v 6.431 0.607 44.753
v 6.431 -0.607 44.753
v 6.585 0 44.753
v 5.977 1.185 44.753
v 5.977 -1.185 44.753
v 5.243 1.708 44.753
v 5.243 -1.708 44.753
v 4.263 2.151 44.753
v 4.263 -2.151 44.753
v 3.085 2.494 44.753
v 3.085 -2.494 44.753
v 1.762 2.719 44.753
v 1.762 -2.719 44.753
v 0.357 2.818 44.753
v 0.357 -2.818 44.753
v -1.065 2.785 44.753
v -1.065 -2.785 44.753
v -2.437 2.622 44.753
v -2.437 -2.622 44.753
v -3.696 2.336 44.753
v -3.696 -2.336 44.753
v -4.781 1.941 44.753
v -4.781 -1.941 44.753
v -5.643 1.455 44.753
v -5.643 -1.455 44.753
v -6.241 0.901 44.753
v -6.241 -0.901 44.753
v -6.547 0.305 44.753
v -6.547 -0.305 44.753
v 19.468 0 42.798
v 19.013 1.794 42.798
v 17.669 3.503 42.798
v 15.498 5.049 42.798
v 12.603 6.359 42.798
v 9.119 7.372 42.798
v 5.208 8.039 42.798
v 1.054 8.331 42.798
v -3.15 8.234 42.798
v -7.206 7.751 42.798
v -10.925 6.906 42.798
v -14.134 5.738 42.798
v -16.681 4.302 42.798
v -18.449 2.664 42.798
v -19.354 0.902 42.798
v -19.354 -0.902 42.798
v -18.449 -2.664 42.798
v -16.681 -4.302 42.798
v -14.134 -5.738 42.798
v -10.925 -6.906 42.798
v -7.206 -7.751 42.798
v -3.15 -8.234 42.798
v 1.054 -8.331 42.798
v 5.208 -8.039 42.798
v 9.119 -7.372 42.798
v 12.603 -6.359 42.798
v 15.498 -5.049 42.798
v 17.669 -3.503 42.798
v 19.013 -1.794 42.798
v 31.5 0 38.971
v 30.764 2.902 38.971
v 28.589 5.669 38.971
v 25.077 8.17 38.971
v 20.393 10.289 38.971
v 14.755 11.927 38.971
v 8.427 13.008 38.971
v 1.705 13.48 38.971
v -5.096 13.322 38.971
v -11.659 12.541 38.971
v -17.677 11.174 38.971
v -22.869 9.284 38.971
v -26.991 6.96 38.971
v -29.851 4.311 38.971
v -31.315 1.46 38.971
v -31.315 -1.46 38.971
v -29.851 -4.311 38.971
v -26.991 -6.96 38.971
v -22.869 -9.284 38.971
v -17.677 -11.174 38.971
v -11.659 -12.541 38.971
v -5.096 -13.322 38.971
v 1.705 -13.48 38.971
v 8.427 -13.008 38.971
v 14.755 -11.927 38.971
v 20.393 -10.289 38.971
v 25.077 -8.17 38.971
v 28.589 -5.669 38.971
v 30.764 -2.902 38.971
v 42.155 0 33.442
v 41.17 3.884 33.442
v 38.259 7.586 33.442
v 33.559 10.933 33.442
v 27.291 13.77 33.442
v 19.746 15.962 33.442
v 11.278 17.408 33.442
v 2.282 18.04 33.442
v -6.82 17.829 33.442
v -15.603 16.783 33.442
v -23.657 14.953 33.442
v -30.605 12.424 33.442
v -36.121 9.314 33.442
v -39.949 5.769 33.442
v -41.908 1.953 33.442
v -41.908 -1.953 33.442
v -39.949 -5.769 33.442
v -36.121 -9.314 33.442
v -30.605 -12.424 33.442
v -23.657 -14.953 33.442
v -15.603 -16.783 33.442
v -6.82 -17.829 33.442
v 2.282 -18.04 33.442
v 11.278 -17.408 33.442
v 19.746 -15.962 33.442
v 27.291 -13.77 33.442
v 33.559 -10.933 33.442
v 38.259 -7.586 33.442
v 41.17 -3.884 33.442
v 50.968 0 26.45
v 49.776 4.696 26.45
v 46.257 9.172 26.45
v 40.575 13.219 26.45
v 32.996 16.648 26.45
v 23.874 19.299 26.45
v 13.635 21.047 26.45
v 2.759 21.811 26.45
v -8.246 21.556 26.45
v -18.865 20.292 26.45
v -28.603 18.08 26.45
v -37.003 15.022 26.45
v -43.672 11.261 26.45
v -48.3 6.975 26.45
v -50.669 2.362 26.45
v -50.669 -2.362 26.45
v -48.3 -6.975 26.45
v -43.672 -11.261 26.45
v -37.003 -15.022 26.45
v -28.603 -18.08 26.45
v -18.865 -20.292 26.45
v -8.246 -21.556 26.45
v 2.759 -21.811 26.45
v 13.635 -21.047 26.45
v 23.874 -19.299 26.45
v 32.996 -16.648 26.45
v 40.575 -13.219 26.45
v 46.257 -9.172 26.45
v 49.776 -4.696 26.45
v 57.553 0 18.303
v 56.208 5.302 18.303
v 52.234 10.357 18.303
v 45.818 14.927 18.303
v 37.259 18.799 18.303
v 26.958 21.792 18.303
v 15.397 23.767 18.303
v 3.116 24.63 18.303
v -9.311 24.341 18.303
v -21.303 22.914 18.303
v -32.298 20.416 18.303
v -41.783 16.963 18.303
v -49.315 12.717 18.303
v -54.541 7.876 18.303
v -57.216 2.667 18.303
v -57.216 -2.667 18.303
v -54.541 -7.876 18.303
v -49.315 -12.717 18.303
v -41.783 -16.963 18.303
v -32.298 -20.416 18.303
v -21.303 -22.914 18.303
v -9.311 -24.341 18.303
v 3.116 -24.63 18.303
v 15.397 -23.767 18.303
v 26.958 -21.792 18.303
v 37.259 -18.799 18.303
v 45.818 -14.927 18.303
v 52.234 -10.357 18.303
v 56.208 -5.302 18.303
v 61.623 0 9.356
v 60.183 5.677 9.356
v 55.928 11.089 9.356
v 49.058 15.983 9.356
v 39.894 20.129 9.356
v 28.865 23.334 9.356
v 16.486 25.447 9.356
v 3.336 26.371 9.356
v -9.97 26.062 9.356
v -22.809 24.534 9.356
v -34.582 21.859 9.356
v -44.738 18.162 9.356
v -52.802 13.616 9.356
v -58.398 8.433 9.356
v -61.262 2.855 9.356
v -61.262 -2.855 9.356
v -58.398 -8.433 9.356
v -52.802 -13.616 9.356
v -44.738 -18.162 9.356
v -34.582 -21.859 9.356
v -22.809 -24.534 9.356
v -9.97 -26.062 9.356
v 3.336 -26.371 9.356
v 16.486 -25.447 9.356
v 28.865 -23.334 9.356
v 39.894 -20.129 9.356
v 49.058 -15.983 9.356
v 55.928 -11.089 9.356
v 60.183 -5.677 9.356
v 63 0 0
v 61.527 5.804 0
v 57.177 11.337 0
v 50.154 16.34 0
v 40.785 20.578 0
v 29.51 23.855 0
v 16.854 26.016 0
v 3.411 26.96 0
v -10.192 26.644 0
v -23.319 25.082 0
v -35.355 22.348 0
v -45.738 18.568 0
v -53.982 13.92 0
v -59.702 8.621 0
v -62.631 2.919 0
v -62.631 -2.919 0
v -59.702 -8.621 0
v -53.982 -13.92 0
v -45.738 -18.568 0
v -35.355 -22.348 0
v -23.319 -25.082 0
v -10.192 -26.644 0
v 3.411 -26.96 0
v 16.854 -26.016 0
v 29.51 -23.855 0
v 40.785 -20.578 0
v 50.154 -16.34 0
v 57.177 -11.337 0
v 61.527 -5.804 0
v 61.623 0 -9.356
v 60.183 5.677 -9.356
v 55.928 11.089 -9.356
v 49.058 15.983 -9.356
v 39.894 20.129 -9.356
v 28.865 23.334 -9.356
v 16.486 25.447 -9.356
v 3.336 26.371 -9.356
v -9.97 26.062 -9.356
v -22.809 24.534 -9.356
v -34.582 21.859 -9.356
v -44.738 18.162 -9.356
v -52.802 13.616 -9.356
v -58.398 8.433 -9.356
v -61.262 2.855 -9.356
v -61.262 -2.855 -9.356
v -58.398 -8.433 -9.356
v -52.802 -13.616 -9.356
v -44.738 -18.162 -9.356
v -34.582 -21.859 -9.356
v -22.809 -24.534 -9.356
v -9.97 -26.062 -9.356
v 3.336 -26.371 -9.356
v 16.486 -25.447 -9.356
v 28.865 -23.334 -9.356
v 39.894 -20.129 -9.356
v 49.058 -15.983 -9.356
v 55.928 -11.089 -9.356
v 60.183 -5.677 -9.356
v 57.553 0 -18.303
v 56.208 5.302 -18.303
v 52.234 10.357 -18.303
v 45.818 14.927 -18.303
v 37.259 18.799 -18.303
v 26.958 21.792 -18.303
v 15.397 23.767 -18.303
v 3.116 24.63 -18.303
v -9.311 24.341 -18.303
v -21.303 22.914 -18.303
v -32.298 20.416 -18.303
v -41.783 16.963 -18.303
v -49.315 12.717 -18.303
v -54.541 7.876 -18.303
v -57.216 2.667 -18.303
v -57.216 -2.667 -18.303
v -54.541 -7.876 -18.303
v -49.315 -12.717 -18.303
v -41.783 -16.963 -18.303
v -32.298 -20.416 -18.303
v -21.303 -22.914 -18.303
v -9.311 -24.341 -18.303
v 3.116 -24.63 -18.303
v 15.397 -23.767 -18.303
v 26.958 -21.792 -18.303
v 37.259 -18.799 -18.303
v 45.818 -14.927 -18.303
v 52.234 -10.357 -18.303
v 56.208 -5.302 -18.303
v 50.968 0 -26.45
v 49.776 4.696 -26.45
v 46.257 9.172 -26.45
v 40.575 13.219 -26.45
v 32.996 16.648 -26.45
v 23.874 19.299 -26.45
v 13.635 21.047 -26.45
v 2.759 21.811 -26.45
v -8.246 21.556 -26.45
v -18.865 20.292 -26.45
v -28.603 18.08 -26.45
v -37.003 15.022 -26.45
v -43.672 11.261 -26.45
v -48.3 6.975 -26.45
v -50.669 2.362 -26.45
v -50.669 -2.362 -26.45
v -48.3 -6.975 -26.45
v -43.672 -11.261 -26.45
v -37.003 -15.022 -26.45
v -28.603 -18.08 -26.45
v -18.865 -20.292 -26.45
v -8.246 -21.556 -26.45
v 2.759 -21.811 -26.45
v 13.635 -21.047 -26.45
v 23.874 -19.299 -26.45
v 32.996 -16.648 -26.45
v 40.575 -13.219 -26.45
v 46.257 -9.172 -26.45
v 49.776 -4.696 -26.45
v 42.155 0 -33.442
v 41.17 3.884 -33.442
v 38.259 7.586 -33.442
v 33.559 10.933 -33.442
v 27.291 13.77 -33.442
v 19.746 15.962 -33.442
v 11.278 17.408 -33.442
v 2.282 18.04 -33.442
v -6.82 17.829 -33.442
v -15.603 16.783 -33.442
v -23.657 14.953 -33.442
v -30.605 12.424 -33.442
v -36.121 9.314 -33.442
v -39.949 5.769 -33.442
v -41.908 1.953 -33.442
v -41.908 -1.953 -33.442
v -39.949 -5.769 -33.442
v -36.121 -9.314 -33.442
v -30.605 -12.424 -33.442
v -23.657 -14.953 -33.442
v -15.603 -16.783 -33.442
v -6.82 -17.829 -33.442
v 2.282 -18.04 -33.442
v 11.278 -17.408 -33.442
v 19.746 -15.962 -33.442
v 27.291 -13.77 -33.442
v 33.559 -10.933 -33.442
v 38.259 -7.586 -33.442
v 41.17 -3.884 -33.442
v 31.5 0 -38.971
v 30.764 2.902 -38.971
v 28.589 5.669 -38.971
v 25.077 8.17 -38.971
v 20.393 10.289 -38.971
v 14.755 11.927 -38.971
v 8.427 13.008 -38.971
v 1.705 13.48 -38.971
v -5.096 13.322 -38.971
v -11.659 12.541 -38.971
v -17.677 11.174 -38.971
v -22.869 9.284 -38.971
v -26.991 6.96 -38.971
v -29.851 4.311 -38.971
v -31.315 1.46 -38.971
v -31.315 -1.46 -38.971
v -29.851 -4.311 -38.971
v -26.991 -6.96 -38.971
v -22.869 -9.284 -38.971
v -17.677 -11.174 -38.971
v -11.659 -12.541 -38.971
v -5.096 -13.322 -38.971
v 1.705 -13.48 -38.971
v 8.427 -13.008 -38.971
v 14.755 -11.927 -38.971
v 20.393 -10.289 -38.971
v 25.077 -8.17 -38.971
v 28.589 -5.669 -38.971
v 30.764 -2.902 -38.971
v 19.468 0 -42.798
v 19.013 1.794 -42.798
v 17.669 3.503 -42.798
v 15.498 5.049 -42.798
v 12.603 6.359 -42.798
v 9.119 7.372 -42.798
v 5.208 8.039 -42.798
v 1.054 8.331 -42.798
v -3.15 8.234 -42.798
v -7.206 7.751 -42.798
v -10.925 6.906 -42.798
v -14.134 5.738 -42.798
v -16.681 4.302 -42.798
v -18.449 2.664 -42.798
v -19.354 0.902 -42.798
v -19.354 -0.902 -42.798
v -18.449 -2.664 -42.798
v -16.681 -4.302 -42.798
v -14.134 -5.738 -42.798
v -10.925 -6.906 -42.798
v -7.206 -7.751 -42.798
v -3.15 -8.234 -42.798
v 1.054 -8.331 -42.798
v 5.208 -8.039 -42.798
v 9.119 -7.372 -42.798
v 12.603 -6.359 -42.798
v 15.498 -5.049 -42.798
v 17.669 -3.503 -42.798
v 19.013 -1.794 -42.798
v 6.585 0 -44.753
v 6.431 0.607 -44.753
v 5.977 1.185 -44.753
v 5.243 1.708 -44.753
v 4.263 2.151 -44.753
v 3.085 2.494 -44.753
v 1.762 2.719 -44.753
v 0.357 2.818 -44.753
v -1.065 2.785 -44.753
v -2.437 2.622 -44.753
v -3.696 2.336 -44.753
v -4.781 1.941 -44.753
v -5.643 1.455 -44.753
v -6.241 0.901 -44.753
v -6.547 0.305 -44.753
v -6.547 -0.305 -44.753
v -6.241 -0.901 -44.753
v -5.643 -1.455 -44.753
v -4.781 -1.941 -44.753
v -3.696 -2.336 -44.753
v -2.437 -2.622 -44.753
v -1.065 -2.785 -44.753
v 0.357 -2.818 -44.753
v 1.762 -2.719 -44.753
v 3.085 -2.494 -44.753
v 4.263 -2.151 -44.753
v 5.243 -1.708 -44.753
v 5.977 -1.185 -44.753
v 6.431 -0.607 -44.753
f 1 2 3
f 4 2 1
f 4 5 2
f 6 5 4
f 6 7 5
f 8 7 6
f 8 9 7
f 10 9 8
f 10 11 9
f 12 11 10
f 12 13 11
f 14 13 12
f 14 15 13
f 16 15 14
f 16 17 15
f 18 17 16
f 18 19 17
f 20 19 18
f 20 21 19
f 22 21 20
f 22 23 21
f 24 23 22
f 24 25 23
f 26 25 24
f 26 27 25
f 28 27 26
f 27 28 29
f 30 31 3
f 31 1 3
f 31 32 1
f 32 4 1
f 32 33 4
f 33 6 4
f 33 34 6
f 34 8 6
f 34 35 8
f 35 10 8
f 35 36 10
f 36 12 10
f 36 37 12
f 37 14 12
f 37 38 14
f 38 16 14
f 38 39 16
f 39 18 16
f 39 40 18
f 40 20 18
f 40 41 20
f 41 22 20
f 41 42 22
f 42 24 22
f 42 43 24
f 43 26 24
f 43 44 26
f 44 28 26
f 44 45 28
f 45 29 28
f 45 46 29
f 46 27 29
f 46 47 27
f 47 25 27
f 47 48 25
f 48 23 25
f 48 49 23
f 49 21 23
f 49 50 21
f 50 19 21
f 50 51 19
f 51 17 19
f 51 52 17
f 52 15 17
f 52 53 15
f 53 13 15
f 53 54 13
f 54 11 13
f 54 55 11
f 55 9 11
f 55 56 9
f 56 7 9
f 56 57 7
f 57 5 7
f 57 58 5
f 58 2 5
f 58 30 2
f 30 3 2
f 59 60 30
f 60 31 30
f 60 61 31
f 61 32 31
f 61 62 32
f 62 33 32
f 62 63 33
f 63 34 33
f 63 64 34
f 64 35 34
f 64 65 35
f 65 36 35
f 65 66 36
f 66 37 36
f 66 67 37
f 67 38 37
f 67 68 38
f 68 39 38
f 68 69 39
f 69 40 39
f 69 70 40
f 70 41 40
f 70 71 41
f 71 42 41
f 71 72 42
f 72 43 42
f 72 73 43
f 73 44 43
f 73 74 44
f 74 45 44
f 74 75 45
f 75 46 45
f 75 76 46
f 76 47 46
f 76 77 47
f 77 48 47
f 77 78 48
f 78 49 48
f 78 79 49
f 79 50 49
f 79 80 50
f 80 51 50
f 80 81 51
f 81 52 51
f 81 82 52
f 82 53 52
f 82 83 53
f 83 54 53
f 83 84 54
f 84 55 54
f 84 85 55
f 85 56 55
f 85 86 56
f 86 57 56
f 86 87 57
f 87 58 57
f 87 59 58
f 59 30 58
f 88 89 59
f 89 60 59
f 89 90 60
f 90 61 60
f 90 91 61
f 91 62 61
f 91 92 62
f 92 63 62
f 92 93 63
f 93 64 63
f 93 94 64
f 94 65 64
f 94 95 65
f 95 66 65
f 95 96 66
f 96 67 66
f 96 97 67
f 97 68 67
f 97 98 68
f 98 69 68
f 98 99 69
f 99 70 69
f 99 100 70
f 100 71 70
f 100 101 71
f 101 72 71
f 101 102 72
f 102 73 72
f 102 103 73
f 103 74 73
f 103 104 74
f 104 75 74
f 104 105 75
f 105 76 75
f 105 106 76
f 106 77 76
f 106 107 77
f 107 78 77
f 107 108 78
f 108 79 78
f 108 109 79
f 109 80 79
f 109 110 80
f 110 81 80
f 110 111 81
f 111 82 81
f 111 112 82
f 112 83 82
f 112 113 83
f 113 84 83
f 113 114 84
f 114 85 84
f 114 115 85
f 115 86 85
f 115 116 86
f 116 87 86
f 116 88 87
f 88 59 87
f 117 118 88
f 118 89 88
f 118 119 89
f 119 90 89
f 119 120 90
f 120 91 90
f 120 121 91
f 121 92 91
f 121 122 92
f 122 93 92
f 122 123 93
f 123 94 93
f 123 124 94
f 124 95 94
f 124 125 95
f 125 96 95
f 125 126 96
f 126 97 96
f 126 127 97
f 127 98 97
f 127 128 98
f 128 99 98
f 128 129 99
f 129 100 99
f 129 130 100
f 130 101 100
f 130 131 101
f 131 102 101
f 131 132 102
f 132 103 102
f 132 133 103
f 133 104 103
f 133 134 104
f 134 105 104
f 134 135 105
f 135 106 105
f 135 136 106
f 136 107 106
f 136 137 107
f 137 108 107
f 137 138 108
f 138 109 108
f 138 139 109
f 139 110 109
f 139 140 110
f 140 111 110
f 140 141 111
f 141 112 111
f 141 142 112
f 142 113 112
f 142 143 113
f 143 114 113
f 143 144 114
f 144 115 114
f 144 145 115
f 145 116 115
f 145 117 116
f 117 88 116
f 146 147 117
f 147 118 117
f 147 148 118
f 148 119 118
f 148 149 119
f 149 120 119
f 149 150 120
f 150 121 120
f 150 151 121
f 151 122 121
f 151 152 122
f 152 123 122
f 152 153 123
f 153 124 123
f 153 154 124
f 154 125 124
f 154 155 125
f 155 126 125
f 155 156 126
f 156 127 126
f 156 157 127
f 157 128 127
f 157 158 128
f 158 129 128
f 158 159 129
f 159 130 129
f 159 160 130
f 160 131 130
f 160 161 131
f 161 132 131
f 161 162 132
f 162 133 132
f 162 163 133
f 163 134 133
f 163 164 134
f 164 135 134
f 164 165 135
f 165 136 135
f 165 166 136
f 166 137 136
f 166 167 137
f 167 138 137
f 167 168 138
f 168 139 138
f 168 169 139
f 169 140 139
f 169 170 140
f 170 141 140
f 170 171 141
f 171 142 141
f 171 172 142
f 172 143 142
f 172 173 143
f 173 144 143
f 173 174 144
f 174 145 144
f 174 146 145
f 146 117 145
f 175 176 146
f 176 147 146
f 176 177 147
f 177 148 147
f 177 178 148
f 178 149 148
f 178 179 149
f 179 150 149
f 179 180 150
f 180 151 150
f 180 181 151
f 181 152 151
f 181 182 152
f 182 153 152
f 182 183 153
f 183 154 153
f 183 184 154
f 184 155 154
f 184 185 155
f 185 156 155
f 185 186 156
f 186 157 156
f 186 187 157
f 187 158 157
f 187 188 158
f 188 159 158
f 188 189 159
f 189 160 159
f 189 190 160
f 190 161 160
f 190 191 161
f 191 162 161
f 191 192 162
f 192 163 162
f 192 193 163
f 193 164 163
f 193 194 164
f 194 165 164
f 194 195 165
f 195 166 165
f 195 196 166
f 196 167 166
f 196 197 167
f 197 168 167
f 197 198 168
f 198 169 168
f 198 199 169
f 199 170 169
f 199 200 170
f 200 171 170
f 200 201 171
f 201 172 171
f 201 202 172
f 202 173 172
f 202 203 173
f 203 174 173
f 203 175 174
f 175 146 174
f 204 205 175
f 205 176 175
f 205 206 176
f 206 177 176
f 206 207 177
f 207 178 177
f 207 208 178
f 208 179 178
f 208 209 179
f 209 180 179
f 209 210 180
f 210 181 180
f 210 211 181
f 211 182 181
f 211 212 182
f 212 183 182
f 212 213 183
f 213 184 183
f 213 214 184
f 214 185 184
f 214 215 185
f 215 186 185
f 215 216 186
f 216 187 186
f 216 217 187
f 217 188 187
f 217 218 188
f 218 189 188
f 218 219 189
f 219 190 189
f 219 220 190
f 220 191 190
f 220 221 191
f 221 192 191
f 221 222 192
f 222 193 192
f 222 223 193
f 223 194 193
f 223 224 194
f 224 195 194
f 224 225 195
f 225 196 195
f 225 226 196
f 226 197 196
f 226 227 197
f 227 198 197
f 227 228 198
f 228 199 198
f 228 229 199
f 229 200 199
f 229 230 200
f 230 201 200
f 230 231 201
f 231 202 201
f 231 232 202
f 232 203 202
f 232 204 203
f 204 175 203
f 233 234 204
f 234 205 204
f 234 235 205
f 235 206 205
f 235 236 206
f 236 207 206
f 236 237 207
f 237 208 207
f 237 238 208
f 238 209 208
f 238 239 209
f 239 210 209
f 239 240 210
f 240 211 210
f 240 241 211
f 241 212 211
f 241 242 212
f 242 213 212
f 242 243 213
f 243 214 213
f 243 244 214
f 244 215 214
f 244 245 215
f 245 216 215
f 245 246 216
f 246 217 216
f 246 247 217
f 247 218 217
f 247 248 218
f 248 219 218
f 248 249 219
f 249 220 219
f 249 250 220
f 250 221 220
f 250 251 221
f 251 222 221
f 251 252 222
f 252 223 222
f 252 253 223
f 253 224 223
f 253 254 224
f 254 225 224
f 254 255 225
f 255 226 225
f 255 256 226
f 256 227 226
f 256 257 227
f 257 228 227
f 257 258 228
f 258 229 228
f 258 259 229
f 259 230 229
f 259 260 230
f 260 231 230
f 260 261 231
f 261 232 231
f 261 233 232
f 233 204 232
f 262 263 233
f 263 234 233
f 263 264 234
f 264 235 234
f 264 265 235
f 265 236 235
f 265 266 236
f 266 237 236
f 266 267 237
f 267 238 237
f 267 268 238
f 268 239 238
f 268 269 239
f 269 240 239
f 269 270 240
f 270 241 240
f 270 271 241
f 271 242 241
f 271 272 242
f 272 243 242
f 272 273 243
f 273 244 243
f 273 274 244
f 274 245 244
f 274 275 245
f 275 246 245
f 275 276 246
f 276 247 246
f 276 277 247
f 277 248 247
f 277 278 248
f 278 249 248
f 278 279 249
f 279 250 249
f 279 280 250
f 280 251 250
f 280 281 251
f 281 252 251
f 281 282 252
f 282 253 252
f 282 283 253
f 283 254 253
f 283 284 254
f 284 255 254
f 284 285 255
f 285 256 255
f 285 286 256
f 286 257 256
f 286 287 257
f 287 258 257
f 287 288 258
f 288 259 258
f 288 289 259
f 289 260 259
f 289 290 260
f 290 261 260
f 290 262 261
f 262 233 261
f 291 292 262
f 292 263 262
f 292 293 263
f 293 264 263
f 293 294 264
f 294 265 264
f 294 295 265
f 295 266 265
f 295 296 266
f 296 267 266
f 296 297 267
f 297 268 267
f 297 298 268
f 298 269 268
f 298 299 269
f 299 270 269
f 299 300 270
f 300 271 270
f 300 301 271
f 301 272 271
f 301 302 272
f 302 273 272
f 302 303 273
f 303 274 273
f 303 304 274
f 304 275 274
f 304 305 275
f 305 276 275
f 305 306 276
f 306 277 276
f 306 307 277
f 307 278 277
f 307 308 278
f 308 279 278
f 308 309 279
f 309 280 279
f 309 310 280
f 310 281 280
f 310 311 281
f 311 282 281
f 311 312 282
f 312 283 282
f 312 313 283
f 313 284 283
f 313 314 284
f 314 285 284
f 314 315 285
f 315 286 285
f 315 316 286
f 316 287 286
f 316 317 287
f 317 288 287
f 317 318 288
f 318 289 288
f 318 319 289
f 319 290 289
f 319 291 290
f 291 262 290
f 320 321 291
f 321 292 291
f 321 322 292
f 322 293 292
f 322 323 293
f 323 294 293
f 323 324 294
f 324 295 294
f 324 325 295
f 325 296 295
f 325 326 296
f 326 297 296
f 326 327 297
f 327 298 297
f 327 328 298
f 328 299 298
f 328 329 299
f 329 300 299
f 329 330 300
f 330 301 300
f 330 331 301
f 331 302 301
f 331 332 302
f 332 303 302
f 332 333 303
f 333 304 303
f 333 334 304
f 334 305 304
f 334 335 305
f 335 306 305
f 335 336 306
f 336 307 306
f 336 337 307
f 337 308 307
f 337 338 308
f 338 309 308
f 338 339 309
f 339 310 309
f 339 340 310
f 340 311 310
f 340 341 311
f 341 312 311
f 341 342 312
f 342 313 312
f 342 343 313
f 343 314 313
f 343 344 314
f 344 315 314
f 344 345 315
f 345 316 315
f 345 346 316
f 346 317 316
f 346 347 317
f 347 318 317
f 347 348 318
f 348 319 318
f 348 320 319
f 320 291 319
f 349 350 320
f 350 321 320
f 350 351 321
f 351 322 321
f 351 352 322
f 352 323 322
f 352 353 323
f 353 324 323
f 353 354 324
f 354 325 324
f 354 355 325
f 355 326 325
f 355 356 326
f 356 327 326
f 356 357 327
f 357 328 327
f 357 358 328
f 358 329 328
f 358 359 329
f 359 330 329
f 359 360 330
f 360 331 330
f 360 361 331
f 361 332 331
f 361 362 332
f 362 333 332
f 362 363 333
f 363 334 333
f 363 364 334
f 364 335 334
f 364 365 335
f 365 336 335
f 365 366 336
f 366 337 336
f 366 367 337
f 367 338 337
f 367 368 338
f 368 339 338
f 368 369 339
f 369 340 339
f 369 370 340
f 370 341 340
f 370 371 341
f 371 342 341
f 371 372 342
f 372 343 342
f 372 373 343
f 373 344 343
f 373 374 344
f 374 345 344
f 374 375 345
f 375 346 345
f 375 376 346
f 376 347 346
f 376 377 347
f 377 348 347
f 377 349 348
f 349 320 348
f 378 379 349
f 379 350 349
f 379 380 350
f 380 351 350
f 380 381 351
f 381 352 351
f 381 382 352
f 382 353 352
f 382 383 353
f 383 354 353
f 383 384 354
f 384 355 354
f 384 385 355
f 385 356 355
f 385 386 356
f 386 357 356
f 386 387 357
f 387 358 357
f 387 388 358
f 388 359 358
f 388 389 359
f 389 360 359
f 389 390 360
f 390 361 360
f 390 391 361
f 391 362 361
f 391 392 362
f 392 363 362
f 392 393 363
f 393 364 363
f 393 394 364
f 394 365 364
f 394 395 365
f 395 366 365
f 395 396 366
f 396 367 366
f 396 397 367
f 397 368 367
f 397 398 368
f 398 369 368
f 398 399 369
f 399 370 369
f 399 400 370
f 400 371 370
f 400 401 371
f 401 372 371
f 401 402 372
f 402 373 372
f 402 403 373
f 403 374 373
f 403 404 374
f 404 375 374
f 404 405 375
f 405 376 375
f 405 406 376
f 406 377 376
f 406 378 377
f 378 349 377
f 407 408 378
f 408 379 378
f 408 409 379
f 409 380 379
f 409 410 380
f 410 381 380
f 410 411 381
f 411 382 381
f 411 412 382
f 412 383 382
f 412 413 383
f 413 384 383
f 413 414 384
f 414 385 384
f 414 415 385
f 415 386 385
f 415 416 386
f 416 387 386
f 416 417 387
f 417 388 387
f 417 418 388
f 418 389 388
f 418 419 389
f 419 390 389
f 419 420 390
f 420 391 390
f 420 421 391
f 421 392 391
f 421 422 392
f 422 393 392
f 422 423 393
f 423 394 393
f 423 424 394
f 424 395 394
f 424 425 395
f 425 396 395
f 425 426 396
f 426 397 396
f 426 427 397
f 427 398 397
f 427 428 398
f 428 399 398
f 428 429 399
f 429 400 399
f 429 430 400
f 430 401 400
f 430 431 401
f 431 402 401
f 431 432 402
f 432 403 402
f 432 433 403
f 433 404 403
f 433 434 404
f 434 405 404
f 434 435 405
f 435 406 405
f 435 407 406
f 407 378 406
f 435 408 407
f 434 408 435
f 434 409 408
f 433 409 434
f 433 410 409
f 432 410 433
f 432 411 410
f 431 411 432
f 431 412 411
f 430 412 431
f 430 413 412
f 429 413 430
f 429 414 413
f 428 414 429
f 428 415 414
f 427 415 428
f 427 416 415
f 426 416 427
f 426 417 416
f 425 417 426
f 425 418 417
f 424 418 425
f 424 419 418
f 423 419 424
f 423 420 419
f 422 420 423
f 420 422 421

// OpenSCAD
// Generated by SolidPython 1.0.1 on 2020-07-29 00:46:47


scale(v = [7, 3, 5]) {
	sphere(r = 9);
}
/***********************************************
*********      SolidPython code:      **********
************************************************
 
# import packages: SolidPython
from solid import *
from solid.utils import *
from itertools import chain, combinations, permutations


class Resize:

    def __init__(self, scad_file):
        self.scad_file = scad_file
        #self.scad_file = import_scad(scad_file)
        # cone/cylinder param:
        self.r1 = 0
        self.r2 = 0
        self.h = 0
        # rectangular prism param:
        self.w = 0
        self.l = 0
        # ellipse param:
        self.r = 0

    # import OpenScad code (file name corresponds to shape)


    # classify shape + parameters
    def assign(self, param1, param2, param3):
        if self.scad_file == 'cone.scad':
            self.r1 = param1
            self.r2 = param2
            self.h = param3
        elif self.scad_file == 'cylinder.scad':
            self.r1 = param1
            self.r2 = param2
            self.h = param3
        elif self.scad_file == 'rectangularPrism.scad':
            self.h = param1
            self.l = param2
            self.w = param3
        else:
            self.r = param1
            self.h = param2

    # resize parameters
    def iterate(self):
        x = range(3, 20, 2)
        i = 1
        if self.scad_file == 'cone.scad':
            tempList = list(permutations(x, 2))
            for temp in tempList:
                param1 = temp[0]
                param2 = temp[1]
                filepath = 'produced_scad_files/' + 'cone' + str(param1) + '_' + str(param2) + '_' + '.scad'
                scad_render_to_file(cylinder(h=param1, r1=param2, r2=0), filepath)

        elif self.scad_file == 'cylinder.scad':
            tempList = list(permutations(x, 3))
            for temp in tempList:
                param1 = temp[0]
                param2 = temp[1]
                filepath = 'produced_scad_files/' + 'cylinder' + str(param1) + '_' + str(param2) + '_' + '.scad'
                scad_render_to_file(cylinder(h=param1, r1=param2, r2=param2), filepath)

        elif self.scad_file == 'rectangularPrism.scad':
            tempList = list(permutations(x, 3))
            for temp in tempList:
                param1 = temp[0]
                param2 = temp[1]
                param3 = temp[2]
                filepath = 'produced_scad_files/' + 'rectangularPrism' + str(param1) + '_' + str(param2) + '_' + str(
                    param3) + '.scad'
                scad_render_to_file(cube(size=(param1, param2, param3)), filepath)

        elif self.scad_file == 'ellipse.scad':
            tempList = list(permutations(x, 4))
            for temp in tempList:
                param1 = temp[0]
                param2 = temp[1]
                param3 = temp[2]
                param4 = temp[3]
                filepath = 'produced_scad_files/' + 'ellipse' + str(param1) + '_' + str(param2) + '_' + str(param3) + '_' + str(param4) + '.scad'
                scad_render_to_file(scale([param1, param2, param3])(sphere(r=param4)), filepath)

    def render_to_scadfile(self):
        scad_render_to_file(scad, 'example.scad') 
 
************************************************/
